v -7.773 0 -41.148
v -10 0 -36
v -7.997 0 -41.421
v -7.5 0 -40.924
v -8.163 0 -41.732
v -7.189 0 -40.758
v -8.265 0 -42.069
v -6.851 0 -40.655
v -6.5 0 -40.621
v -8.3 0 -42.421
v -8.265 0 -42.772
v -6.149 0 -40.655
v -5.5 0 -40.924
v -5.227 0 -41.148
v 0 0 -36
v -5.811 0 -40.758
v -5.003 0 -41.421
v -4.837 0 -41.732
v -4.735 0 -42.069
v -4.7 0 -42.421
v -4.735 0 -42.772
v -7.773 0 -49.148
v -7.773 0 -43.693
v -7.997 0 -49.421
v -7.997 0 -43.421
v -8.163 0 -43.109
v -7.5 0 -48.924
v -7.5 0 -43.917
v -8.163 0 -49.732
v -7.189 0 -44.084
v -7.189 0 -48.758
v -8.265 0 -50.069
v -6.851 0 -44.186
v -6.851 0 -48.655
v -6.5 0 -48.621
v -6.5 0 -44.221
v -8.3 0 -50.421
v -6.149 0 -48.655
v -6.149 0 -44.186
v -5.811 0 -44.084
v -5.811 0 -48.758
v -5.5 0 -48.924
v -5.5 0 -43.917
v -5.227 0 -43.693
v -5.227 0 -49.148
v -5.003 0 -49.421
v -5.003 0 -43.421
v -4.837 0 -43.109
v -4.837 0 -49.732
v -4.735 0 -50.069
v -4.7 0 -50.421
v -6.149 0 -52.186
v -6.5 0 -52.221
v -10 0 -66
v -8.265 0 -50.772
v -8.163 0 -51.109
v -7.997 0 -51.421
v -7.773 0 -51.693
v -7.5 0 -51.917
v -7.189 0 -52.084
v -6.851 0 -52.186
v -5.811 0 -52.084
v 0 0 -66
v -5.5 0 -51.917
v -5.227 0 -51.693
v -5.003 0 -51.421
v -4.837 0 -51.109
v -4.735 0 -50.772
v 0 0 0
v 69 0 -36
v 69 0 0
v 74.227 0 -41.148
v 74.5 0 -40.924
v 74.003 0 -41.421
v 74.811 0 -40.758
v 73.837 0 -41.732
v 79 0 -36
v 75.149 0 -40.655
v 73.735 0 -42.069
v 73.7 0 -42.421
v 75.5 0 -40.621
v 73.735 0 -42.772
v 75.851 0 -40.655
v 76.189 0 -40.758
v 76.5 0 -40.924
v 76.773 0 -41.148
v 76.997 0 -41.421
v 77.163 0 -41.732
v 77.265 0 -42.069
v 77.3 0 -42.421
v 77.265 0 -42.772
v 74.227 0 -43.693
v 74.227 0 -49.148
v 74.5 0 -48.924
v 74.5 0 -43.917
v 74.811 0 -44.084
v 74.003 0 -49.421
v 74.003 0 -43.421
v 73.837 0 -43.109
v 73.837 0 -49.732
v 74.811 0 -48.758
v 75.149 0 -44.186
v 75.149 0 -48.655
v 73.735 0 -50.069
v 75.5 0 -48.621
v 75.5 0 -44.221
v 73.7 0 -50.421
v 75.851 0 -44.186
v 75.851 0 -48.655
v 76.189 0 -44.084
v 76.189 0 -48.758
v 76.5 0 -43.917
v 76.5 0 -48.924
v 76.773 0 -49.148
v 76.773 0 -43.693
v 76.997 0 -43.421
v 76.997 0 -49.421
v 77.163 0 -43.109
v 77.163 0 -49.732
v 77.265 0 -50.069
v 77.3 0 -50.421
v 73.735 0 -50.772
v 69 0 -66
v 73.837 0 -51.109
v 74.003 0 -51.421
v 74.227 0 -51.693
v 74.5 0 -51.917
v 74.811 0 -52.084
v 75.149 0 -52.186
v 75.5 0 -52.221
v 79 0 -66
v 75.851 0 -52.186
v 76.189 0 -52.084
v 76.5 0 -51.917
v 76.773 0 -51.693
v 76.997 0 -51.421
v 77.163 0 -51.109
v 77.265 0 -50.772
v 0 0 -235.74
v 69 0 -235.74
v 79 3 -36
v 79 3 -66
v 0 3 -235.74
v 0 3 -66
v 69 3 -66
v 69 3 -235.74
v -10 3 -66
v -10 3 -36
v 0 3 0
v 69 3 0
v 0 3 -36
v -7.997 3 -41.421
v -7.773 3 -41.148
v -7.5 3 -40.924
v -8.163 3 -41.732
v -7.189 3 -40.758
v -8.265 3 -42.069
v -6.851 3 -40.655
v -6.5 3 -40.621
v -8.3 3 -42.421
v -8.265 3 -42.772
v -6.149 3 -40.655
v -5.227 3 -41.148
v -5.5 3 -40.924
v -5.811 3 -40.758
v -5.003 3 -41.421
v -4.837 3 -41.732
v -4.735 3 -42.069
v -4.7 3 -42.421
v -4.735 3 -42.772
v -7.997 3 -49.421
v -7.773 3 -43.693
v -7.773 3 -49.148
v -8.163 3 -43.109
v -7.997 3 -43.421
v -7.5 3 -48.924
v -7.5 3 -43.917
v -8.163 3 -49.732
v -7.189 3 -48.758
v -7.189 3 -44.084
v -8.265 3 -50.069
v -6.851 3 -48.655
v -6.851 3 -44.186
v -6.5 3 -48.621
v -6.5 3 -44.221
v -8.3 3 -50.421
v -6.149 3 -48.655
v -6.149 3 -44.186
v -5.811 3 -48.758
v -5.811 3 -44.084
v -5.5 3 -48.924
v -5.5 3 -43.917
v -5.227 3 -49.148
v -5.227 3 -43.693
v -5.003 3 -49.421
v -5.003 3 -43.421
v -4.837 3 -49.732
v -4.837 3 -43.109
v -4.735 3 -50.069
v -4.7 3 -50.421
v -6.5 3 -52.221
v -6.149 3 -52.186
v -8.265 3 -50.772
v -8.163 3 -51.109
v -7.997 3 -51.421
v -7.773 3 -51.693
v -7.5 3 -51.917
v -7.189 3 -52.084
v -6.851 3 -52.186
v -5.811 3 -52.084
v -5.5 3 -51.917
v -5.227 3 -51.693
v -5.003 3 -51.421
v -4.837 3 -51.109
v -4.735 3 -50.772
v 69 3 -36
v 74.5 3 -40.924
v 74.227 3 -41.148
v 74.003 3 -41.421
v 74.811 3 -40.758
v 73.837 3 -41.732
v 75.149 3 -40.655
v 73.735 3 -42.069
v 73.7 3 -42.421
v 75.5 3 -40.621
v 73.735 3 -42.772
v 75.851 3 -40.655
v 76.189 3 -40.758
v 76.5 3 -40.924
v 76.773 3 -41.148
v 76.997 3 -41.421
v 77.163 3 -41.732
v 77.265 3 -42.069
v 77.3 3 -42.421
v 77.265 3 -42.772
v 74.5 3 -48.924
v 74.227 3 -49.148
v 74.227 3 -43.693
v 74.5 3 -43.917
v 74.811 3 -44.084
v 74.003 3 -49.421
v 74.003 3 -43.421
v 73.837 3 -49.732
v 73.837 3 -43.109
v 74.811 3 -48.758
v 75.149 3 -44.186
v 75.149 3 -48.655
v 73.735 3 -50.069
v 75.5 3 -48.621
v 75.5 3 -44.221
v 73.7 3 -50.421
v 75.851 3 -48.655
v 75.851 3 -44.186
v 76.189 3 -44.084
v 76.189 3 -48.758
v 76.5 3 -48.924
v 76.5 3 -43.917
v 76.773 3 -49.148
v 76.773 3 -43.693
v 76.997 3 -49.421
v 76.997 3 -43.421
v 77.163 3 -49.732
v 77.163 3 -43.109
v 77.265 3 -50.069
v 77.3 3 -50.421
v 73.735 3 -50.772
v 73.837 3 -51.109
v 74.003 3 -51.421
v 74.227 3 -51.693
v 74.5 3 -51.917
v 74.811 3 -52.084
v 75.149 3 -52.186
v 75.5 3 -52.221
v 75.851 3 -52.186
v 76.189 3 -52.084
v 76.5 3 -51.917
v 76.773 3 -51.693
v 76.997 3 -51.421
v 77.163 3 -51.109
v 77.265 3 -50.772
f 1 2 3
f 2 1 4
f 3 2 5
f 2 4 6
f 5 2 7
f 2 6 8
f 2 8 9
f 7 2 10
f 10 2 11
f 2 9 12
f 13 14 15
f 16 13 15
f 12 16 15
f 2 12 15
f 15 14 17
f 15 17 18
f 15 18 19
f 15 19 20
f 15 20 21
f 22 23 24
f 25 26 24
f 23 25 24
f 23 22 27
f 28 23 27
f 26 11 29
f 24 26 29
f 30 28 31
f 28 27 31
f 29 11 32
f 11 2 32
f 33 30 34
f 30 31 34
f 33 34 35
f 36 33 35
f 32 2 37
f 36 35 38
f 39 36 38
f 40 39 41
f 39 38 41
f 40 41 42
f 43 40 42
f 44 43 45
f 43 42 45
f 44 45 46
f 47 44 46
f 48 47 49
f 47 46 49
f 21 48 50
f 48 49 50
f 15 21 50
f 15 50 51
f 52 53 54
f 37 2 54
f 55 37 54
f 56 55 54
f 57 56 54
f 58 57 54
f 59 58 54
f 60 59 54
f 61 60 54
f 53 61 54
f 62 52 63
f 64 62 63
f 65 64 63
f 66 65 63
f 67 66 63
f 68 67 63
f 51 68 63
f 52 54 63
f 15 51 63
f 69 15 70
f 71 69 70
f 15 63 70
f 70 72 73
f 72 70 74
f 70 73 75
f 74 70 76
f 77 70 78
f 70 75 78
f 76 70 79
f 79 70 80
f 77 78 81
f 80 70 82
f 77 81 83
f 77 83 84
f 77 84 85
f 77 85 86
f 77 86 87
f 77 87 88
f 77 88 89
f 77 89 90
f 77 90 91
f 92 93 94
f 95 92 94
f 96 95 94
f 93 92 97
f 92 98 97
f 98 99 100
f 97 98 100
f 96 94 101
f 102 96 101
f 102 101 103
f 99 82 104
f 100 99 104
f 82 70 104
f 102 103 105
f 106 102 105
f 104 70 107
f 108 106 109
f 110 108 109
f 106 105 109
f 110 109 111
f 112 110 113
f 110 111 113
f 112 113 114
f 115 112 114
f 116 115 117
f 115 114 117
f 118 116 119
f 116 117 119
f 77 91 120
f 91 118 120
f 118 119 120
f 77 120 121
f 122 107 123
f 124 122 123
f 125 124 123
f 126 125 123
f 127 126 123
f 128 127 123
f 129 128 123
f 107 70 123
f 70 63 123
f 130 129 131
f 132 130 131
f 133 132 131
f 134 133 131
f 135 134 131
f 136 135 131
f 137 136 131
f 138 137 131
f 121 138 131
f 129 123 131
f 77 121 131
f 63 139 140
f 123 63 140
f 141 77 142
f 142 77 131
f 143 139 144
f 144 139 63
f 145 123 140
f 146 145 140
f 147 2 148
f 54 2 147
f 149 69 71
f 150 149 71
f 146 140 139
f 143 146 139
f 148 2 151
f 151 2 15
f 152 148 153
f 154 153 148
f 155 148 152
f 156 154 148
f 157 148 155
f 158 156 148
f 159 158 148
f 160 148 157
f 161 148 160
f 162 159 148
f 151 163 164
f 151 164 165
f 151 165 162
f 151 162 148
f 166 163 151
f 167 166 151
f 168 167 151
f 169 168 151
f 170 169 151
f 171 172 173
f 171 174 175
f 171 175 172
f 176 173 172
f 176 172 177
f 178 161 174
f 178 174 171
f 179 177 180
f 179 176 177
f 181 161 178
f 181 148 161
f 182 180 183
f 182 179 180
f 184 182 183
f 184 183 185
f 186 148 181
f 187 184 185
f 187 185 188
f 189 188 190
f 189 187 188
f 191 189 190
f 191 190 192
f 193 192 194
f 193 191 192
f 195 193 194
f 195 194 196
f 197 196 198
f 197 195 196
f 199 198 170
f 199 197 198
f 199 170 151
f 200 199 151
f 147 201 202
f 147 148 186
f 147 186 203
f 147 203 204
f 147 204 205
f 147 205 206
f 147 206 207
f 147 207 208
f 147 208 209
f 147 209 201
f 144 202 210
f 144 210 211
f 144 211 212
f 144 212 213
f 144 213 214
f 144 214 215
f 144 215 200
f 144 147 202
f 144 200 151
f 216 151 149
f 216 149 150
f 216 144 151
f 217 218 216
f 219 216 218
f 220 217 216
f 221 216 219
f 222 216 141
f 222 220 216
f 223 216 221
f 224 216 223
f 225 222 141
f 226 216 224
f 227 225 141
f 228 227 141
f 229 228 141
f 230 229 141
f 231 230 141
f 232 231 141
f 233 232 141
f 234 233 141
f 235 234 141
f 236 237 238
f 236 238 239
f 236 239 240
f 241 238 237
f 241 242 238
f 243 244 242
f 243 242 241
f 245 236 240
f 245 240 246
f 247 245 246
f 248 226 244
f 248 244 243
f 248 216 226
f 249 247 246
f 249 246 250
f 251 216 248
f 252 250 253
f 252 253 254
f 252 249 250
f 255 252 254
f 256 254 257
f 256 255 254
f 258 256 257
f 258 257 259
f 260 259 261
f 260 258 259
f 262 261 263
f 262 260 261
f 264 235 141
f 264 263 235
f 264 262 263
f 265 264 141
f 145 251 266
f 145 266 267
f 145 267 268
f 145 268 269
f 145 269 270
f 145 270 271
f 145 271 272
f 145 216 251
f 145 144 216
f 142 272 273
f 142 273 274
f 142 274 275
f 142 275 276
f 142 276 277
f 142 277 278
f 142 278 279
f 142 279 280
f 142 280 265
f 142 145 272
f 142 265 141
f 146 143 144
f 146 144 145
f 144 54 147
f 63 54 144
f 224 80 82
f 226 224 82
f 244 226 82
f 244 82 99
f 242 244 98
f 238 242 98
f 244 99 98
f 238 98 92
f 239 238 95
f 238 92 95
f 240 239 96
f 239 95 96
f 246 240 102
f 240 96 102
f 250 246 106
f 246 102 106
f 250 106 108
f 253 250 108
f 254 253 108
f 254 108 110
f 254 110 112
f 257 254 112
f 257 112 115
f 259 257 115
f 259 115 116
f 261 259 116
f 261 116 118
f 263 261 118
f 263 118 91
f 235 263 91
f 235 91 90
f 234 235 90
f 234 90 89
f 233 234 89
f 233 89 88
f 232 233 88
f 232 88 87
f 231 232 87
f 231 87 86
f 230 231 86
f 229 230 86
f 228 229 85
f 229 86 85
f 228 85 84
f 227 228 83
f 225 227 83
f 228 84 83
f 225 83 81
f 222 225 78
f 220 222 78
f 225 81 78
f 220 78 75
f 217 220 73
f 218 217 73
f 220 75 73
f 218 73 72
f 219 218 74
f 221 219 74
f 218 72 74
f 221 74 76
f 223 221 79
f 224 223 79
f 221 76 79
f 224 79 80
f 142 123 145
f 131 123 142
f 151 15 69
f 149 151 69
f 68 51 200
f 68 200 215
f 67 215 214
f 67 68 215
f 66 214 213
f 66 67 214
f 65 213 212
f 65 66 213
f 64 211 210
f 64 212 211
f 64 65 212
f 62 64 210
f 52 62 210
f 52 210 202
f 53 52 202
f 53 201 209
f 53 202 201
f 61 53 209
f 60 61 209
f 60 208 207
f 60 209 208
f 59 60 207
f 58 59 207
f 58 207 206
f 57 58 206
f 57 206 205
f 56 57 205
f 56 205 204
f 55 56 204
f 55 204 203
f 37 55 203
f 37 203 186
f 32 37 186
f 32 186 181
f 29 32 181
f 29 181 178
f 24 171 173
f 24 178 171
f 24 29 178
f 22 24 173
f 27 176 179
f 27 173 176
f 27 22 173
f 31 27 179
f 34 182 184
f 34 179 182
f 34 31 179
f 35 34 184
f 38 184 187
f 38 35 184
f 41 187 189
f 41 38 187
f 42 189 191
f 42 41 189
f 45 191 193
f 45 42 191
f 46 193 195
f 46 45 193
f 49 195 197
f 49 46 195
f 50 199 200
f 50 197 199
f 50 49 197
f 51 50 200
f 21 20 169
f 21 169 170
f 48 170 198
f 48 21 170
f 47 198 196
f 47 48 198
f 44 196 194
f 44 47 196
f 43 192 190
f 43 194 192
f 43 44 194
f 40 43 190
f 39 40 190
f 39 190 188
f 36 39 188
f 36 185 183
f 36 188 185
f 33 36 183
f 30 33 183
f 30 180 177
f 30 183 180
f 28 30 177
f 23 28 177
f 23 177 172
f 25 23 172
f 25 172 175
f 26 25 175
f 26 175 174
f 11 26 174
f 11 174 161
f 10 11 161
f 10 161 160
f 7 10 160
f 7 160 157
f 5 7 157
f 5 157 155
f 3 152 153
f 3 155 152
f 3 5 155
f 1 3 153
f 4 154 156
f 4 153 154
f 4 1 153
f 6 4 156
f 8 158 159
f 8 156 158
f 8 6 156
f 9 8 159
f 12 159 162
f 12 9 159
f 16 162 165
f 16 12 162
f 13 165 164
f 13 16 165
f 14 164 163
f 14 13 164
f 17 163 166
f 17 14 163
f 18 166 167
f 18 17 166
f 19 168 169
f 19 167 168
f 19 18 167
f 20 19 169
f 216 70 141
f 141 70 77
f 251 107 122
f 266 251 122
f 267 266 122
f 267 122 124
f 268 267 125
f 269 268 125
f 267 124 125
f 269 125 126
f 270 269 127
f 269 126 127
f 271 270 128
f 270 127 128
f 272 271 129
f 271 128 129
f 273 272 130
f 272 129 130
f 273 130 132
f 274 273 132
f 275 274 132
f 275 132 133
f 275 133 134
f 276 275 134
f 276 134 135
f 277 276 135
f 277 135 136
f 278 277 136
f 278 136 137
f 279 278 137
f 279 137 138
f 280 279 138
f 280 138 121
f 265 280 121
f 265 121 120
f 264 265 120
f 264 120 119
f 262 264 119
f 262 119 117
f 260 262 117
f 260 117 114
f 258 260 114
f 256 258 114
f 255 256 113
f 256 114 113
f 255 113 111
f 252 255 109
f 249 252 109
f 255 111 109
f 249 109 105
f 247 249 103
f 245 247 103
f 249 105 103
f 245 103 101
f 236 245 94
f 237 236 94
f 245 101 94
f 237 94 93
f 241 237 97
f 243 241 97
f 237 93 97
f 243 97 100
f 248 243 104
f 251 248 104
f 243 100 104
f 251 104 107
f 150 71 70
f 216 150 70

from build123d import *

# Parameters (mm, degrees)
SKETCH5_W            = 10
SKETCH5_H            = 30
BOSS_EXTRUDE5_DEPTH  = 3
M3_CLEARANCE_HOLE1_D = 3.6


with BuildPart() as part:
    # Sketch5 → Boss-Extrude5 (new body)
    with BuildSketch(Plane(origin=(0, 0, 0), x_dir=(1, 0, 0), z_dir=(0, 1, 0))):
        with Locations((-5, 51)):
            Rectangle(SKETCH5_W, SKETCH5_H)
        Polygon((0, 0), (34.5, 0), (34.5, 235.74), (0, 235.74), (0, 66), (0, 36), align=None)
        Polygon((69, 0), (69, 36), (69, 66), (69, 235.74), (34.5, 235.74), (34.5, 0), align=None)
        with Locations((74, 51)):
            Rectangle(SKETCH5_W, SKETCH5_H)
    extrude(amount=BOSS_EXTRUDE5_DEPTH)

    # M3 Clearance Hole1 (through all)
    with Locations(Plane(origin=(0, 3, 0), x_dir=(1, 0, 0), z_dir=(0, 1, 0))):
        with Locations((75.5, 50.420635549), (75.5, 42.420635549)):
            m3_clearance_hole1 = Hole(M3_CLEARANCE_HOLE1_D / 2)

    # Mirror1: M3 Clearance Hole1 across plane
    add(m3_clearance_hole1.mirror(Plane(origin=(34.5, 0, 0), x_dir=(0, 0, 1), z_dir=(1, 0, 0))), mode=Mode.SUBTRACT)


solid = part.part
